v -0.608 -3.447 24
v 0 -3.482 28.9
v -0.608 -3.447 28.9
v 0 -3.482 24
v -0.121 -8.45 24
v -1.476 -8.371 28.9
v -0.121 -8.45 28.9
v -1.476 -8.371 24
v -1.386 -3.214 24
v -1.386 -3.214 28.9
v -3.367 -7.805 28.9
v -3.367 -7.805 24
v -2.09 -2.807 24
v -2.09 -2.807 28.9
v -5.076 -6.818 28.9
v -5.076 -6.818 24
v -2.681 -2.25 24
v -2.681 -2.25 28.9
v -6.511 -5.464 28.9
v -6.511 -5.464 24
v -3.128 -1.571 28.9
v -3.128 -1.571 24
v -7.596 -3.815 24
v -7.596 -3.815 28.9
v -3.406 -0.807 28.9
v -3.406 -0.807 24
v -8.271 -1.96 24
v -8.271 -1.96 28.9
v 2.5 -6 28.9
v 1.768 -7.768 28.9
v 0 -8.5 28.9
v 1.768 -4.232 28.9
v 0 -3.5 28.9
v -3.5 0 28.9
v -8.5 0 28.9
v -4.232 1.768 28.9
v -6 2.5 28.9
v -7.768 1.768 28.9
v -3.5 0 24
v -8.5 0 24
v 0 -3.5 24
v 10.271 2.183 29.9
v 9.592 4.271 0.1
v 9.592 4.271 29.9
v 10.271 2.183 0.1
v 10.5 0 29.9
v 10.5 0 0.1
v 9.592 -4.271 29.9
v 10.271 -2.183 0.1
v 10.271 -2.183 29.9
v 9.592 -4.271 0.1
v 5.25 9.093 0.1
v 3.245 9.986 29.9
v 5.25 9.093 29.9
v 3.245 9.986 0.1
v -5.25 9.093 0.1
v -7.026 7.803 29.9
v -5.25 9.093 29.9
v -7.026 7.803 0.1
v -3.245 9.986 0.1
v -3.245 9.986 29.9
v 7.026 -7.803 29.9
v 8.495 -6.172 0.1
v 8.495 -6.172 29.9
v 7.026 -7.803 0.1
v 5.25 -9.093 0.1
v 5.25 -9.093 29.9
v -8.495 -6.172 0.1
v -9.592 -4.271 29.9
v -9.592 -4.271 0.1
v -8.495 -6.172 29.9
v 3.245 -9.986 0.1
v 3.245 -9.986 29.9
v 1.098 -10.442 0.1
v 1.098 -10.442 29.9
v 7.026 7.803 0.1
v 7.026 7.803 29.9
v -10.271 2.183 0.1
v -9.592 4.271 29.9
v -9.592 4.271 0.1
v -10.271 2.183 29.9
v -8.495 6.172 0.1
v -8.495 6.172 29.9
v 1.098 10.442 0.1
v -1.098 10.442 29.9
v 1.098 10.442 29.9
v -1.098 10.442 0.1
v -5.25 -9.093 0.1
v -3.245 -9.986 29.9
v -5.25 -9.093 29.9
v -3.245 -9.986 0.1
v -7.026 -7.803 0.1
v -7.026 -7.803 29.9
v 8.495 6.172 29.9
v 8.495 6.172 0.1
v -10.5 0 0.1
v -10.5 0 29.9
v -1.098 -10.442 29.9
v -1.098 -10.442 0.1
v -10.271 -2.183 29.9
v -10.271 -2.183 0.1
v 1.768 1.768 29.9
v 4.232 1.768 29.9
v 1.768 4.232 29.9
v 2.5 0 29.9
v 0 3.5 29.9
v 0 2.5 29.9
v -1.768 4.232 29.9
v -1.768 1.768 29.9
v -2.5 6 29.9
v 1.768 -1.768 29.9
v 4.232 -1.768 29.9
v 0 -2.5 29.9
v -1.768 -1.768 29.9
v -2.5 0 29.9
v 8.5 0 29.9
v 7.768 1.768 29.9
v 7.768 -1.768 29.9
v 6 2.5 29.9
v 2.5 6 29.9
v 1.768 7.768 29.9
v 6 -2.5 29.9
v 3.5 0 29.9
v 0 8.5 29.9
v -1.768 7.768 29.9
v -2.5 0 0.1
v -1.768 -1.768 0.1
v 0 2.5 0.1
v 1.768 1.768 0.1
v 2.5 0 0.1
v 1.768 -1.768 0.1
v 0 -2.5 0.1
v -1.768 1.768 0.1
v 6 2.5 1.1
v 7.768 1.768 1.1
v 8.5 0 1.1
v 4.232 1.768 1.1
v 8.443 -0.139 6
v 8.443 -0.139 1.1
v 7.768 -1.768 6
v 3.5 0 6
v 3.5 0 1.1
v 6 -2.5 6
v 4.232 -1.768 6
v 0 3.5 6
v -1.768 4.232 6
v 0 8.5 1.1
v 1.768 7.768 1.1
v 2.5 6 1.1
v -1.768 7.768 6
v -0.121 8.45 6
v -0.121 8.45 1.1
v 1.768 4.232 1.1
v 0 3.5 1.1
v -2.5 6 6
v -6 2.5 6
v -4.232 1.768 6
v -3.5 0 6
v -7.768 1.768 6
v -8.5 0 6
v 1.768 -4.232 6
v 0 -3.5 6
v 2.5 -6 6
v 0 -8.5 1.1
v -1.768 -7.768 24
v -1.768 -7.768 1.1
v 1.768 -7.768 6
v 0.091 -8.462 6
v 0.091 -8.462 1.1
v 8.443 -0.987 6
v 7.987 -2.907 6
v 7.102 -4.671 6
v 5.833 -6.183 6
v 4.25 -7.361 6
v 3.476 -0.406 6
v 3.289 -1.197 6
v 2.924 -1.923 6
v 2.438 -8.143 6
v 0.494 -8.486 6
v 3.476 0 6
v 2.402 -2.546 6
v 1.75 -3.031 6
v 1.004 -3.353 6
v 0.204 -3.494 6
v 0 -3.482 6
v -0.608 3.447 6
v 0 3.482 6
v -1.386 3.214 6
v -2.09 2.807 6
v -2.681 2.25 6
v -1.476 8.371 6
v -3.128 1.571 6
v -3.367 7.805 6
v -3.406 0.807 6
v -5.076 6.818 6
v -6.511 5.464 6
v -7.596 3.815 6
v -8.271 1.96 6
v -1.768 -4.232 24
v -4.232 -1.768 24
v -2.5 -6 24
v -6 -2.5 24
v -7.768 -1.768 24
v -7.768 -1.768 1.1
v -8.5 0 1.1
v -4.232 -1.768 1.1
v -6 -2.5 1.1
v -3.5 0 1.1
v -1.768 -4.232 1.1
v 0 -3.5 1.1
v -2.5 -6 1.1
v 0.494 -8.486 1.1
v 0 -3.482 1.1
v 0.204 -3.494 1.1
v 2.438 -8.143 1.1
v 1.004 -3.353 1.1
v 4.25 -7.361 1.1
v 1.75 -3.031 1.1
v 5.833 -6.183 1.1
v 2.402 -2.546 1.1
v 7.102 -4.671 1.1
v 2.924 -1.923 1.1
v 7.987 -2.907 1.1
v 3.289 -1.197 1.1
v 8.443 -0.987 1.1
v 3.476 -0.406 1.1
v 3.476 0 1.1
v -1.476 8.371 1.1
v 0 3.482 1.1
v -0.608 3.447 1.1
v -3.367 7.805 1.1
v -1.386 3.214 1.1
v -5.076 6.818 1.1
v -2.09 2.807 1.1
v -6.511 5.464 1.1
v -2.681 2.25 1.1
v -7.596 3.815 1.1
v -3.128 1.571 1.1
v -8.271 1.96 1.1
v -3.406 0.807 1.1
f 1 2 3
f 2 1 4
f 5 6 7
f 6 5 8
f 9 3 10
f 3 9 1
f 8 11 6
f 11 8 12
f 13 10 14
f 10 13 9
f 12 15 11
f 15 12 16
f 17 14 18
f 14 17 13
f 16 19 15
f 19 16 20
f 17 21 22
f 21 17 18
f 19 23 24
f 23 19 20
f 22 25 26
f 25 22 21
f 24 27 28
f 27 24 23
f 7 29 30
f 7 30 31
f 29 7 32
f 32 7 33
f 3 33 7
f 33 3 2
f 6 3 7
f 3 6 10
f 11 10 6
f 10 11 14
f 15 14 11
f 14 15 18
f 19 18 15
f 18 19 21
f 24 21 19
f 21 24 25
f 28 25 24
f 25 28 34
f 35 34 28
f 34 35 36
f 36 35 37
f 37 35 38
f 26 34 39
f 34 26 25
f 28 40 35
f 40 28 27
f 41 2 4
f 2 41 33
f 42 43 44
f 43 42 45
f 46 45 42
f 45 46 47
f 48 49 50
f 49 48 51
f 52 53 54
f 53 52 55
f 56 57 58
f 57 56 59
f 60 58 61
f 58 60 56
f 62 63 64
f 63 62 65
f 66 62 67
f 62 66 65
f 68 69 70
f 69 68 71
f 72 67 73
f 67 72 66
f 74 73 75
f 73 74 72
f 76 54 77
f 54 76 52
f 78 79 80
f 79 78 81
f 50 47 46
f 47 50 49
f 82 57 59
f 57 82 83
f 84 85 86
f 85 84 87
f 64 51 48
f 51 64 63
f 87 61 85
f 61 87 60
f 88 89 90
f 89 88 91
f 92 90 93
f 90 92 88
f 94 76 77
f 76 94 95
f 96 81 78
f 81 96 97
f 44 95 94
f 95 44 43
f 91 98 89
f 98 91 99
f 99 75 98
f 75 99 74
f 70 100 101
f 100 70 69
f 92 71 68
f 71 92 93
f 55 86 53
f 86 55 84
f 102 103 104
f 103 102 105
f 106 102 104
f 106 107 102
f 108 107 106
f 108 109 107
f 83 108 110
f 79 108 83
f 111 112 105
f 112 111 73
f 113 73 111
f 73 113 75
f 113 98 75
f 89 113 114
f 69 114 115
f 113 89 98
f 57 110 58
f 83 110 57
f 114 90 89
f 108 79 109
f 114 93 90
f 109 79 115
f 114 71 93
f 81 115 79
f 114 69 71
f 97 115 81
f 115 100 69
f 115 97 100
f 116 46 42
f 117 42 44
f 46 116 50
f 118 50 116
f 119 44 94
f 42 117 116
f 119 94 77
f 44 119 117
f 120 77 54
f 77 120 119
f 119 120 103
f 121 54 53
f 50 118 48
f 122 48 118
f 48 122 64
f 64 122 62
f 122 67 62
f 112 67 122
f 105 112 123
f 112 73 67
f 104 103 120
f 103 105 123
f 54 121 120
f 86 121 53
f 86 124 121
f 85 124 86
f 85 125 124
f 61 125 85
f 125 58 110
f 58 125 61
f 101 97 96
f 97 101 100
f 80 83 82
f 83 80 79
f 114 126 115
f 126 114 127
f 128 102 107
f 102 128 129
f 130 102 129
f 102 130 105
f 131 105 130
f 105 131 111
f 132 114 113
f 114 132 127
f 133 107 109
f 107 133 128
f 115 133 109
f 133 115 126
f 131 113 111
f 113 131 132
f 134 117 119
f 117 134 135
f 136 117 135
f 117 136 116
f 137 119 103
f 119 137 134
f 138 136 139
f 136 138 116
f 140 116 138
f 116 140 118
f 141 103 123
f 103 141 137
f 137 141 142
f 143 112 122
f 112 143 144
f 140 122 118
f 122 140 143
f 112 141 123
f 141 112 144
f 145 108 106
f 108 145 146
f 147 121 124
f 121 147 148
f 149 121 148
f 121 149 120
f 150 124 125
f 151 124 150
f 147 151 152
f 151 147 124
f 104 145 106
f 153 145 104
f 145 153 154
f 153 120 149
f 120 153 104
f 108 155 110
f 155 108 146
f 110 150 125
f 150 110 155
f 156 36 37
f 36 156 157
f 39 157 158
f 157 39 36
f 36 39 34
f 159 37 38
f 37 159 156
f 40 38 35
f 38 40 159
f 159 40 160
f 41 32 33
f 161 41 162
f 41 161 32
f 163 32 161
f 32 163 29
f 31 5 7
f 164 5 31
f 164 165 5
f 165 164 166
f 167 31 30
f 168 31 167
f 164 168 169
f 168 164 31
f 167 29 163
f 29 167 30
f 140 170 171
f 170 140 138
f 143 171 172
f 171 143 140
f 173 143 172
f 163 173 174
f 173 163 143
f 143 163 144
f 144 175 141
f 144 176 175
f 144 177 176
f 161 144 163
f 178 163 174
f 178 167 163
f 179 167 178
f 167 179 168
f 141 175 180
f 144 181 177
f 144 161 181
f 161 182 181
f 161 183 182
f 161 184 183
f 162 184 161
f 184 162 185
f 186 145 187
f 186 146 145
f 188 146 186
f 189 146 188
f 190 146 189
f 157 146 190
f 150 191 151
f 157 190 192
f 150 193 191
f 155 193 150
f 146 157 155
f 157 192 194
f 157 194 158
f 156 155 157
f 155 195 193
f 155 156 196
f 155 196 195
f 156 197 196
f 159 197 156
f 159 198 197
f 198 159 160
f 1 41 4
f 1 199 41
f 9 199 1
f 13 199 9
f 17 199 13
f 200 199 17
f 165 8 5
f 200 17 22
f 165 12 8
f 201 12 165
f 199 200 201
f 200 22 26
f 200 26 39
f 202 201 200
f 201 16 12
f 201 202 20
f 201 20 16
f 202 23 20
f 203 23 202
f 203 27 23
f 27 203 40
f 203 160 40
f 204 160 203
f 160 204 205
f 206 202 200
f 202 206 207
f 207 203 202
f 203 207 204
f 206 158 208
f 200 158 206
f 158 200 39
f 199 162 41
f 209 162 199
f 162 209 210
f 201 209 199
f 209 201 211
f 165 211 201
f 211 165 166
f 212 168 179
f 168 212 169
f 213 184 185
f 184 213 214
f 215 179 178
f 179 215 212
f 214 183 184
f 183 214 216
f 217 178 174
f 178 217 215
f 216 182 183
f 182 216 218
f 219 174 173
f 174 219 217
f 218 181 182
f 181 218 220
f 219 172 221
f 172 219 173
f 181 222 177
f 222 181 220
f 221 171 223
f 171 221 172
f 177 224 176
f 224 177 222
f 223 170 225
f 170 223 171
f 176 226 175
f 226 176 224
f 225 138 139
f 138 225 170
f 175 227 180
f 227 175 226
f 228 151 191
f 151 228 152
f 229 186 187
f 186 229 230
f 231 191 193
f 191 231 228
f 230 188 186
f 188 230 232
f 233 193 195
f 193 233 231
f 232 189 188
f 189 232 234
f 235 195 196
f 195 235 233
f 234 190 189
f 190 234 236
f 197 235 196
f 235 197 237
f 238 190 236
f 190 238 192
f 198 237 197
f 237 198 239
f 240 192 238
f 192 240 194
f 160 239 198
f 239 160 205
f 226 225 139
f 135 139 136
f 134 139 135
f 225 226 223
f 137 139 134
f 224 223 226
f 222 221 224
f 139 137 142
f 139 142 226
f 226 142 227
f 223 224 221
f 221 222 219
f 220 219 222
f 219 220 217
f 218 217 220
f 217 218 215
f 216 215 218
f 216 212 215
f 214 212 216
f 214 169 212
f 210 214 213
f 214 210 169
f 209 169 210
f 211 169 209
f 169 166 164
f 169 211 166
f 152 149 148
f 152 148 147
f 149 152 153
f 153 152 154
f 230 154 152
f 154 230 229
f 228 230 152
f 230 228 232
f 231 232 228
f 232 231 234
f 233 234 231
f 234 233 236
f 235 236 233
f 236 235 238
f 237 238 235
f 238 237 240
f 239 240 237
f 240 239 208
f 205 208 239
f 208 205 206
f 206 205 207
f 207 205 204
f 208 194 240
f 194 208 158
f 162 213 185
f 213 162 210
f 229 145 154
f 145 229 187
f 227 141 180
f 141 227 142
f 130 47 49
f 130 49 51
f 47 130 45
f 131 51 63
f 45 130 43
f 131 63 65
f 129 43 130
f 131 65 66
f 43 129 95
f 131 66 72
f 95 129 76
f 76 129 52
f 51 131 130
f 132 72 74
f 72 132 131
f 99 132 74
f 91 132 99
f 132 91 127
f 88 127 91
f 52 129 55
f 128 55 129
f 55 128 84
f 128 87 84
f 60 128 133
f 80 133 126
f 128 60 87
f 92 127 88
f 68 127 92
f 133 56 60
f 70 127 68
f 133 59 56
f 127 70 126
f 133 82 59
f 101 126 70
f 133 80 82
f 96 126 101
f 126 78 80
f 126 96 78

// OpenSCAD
// file: colours.scad
al = [0.67578125, 0.6953125, 0.73828125];
steel = [0.2734375, 0.5078125, 0.703125];
// main file
include <colours.scad>

module cooler_top() {
	
	color(al) difference() {
		cylinder(r=21/2, h=6);
		translate([0, 0, -0.5]) cylinder(r=2.5, h=7);

		translate([6, 0, -0.5]) cylinder(r=2.5, h=7);
		translate([0, 6, -0.5]) cylinder(r=2.5, h=7);

		translate([-6, 0, -0.5]) cylinder(r=2.5, h=5.5);
		translate([0, -6, -0.5]) cylinder(r=2.5, h=5.5);

		difference() {
			rotate_extrude() translate([3.5, 0, 0]) polygon( points=[[0,0],[5,0],[5,5],[0,5]] );
			translate([-8.5, 0, 0]) cube(size = [8.5, 8.5, 5]);
			translate([0, -8.5, 0]) cube(size = [8.5, 8.5, 5]);
			cube(size = [8.5, 8.5, 5]);
		}
	}
}

module cooler_body() {
	height = 30 - 12;
	color(al) difference() {
		cylinder(r=21/2, h=height);
		translate([0, 0, -0.5]) cylinder(r=2.5, h=height+1);

		translate([6, 0, -0.5]) cylinder(r=2.5, h=height+1);
		translate([0, 6, -0.5]) cylinder(r=2.5, h=height+1);
		translate([-6, 0, -0.5]) cylinder(r=2.5, h=height+1);
		translate([0, -6, -0.5]) cylinder(r=2.5, h=height+1);
	}
}

module cooler_base() {
	color(al) difference() {
		cylinder(r=21/2, h=6);
		translate([0, 0, -0.5]) cylinder(r=2.5, h=7);

		translate([6, 0, -0.5]) cylinder(r=2.5, h=5.5);
		translate([0, 6, -0.5]) cylinder(r=2.5, h=5.5);
		translate([-6, 0, -0.5]) cylinder(r=2.5, h=5.5);
		translate([0, -6, -0.5]) cylinder(r=2.5, h=5.5);

		difference() {
			rotate_extrude() translate([3.5, 0, 0]) square(5,5);
			translate([-8.5, 0, -0.5]) cube(size = [8.5, 8.5, 6]);
			translate([0, -8.5, -0.5]) cube(size = [8.5, 8.5, 6]);
		}
	}
}

module cooler() {
	height = 30 - 12;
	union() {
		translate([0, 0, height+5.9]) cooler_top();
		translate([0, 0, 6]) cooler_body();
		translate([0, 0, 6.1]) rotate([180, 0, 0]) cooler_base();
	}
}

cooler();
